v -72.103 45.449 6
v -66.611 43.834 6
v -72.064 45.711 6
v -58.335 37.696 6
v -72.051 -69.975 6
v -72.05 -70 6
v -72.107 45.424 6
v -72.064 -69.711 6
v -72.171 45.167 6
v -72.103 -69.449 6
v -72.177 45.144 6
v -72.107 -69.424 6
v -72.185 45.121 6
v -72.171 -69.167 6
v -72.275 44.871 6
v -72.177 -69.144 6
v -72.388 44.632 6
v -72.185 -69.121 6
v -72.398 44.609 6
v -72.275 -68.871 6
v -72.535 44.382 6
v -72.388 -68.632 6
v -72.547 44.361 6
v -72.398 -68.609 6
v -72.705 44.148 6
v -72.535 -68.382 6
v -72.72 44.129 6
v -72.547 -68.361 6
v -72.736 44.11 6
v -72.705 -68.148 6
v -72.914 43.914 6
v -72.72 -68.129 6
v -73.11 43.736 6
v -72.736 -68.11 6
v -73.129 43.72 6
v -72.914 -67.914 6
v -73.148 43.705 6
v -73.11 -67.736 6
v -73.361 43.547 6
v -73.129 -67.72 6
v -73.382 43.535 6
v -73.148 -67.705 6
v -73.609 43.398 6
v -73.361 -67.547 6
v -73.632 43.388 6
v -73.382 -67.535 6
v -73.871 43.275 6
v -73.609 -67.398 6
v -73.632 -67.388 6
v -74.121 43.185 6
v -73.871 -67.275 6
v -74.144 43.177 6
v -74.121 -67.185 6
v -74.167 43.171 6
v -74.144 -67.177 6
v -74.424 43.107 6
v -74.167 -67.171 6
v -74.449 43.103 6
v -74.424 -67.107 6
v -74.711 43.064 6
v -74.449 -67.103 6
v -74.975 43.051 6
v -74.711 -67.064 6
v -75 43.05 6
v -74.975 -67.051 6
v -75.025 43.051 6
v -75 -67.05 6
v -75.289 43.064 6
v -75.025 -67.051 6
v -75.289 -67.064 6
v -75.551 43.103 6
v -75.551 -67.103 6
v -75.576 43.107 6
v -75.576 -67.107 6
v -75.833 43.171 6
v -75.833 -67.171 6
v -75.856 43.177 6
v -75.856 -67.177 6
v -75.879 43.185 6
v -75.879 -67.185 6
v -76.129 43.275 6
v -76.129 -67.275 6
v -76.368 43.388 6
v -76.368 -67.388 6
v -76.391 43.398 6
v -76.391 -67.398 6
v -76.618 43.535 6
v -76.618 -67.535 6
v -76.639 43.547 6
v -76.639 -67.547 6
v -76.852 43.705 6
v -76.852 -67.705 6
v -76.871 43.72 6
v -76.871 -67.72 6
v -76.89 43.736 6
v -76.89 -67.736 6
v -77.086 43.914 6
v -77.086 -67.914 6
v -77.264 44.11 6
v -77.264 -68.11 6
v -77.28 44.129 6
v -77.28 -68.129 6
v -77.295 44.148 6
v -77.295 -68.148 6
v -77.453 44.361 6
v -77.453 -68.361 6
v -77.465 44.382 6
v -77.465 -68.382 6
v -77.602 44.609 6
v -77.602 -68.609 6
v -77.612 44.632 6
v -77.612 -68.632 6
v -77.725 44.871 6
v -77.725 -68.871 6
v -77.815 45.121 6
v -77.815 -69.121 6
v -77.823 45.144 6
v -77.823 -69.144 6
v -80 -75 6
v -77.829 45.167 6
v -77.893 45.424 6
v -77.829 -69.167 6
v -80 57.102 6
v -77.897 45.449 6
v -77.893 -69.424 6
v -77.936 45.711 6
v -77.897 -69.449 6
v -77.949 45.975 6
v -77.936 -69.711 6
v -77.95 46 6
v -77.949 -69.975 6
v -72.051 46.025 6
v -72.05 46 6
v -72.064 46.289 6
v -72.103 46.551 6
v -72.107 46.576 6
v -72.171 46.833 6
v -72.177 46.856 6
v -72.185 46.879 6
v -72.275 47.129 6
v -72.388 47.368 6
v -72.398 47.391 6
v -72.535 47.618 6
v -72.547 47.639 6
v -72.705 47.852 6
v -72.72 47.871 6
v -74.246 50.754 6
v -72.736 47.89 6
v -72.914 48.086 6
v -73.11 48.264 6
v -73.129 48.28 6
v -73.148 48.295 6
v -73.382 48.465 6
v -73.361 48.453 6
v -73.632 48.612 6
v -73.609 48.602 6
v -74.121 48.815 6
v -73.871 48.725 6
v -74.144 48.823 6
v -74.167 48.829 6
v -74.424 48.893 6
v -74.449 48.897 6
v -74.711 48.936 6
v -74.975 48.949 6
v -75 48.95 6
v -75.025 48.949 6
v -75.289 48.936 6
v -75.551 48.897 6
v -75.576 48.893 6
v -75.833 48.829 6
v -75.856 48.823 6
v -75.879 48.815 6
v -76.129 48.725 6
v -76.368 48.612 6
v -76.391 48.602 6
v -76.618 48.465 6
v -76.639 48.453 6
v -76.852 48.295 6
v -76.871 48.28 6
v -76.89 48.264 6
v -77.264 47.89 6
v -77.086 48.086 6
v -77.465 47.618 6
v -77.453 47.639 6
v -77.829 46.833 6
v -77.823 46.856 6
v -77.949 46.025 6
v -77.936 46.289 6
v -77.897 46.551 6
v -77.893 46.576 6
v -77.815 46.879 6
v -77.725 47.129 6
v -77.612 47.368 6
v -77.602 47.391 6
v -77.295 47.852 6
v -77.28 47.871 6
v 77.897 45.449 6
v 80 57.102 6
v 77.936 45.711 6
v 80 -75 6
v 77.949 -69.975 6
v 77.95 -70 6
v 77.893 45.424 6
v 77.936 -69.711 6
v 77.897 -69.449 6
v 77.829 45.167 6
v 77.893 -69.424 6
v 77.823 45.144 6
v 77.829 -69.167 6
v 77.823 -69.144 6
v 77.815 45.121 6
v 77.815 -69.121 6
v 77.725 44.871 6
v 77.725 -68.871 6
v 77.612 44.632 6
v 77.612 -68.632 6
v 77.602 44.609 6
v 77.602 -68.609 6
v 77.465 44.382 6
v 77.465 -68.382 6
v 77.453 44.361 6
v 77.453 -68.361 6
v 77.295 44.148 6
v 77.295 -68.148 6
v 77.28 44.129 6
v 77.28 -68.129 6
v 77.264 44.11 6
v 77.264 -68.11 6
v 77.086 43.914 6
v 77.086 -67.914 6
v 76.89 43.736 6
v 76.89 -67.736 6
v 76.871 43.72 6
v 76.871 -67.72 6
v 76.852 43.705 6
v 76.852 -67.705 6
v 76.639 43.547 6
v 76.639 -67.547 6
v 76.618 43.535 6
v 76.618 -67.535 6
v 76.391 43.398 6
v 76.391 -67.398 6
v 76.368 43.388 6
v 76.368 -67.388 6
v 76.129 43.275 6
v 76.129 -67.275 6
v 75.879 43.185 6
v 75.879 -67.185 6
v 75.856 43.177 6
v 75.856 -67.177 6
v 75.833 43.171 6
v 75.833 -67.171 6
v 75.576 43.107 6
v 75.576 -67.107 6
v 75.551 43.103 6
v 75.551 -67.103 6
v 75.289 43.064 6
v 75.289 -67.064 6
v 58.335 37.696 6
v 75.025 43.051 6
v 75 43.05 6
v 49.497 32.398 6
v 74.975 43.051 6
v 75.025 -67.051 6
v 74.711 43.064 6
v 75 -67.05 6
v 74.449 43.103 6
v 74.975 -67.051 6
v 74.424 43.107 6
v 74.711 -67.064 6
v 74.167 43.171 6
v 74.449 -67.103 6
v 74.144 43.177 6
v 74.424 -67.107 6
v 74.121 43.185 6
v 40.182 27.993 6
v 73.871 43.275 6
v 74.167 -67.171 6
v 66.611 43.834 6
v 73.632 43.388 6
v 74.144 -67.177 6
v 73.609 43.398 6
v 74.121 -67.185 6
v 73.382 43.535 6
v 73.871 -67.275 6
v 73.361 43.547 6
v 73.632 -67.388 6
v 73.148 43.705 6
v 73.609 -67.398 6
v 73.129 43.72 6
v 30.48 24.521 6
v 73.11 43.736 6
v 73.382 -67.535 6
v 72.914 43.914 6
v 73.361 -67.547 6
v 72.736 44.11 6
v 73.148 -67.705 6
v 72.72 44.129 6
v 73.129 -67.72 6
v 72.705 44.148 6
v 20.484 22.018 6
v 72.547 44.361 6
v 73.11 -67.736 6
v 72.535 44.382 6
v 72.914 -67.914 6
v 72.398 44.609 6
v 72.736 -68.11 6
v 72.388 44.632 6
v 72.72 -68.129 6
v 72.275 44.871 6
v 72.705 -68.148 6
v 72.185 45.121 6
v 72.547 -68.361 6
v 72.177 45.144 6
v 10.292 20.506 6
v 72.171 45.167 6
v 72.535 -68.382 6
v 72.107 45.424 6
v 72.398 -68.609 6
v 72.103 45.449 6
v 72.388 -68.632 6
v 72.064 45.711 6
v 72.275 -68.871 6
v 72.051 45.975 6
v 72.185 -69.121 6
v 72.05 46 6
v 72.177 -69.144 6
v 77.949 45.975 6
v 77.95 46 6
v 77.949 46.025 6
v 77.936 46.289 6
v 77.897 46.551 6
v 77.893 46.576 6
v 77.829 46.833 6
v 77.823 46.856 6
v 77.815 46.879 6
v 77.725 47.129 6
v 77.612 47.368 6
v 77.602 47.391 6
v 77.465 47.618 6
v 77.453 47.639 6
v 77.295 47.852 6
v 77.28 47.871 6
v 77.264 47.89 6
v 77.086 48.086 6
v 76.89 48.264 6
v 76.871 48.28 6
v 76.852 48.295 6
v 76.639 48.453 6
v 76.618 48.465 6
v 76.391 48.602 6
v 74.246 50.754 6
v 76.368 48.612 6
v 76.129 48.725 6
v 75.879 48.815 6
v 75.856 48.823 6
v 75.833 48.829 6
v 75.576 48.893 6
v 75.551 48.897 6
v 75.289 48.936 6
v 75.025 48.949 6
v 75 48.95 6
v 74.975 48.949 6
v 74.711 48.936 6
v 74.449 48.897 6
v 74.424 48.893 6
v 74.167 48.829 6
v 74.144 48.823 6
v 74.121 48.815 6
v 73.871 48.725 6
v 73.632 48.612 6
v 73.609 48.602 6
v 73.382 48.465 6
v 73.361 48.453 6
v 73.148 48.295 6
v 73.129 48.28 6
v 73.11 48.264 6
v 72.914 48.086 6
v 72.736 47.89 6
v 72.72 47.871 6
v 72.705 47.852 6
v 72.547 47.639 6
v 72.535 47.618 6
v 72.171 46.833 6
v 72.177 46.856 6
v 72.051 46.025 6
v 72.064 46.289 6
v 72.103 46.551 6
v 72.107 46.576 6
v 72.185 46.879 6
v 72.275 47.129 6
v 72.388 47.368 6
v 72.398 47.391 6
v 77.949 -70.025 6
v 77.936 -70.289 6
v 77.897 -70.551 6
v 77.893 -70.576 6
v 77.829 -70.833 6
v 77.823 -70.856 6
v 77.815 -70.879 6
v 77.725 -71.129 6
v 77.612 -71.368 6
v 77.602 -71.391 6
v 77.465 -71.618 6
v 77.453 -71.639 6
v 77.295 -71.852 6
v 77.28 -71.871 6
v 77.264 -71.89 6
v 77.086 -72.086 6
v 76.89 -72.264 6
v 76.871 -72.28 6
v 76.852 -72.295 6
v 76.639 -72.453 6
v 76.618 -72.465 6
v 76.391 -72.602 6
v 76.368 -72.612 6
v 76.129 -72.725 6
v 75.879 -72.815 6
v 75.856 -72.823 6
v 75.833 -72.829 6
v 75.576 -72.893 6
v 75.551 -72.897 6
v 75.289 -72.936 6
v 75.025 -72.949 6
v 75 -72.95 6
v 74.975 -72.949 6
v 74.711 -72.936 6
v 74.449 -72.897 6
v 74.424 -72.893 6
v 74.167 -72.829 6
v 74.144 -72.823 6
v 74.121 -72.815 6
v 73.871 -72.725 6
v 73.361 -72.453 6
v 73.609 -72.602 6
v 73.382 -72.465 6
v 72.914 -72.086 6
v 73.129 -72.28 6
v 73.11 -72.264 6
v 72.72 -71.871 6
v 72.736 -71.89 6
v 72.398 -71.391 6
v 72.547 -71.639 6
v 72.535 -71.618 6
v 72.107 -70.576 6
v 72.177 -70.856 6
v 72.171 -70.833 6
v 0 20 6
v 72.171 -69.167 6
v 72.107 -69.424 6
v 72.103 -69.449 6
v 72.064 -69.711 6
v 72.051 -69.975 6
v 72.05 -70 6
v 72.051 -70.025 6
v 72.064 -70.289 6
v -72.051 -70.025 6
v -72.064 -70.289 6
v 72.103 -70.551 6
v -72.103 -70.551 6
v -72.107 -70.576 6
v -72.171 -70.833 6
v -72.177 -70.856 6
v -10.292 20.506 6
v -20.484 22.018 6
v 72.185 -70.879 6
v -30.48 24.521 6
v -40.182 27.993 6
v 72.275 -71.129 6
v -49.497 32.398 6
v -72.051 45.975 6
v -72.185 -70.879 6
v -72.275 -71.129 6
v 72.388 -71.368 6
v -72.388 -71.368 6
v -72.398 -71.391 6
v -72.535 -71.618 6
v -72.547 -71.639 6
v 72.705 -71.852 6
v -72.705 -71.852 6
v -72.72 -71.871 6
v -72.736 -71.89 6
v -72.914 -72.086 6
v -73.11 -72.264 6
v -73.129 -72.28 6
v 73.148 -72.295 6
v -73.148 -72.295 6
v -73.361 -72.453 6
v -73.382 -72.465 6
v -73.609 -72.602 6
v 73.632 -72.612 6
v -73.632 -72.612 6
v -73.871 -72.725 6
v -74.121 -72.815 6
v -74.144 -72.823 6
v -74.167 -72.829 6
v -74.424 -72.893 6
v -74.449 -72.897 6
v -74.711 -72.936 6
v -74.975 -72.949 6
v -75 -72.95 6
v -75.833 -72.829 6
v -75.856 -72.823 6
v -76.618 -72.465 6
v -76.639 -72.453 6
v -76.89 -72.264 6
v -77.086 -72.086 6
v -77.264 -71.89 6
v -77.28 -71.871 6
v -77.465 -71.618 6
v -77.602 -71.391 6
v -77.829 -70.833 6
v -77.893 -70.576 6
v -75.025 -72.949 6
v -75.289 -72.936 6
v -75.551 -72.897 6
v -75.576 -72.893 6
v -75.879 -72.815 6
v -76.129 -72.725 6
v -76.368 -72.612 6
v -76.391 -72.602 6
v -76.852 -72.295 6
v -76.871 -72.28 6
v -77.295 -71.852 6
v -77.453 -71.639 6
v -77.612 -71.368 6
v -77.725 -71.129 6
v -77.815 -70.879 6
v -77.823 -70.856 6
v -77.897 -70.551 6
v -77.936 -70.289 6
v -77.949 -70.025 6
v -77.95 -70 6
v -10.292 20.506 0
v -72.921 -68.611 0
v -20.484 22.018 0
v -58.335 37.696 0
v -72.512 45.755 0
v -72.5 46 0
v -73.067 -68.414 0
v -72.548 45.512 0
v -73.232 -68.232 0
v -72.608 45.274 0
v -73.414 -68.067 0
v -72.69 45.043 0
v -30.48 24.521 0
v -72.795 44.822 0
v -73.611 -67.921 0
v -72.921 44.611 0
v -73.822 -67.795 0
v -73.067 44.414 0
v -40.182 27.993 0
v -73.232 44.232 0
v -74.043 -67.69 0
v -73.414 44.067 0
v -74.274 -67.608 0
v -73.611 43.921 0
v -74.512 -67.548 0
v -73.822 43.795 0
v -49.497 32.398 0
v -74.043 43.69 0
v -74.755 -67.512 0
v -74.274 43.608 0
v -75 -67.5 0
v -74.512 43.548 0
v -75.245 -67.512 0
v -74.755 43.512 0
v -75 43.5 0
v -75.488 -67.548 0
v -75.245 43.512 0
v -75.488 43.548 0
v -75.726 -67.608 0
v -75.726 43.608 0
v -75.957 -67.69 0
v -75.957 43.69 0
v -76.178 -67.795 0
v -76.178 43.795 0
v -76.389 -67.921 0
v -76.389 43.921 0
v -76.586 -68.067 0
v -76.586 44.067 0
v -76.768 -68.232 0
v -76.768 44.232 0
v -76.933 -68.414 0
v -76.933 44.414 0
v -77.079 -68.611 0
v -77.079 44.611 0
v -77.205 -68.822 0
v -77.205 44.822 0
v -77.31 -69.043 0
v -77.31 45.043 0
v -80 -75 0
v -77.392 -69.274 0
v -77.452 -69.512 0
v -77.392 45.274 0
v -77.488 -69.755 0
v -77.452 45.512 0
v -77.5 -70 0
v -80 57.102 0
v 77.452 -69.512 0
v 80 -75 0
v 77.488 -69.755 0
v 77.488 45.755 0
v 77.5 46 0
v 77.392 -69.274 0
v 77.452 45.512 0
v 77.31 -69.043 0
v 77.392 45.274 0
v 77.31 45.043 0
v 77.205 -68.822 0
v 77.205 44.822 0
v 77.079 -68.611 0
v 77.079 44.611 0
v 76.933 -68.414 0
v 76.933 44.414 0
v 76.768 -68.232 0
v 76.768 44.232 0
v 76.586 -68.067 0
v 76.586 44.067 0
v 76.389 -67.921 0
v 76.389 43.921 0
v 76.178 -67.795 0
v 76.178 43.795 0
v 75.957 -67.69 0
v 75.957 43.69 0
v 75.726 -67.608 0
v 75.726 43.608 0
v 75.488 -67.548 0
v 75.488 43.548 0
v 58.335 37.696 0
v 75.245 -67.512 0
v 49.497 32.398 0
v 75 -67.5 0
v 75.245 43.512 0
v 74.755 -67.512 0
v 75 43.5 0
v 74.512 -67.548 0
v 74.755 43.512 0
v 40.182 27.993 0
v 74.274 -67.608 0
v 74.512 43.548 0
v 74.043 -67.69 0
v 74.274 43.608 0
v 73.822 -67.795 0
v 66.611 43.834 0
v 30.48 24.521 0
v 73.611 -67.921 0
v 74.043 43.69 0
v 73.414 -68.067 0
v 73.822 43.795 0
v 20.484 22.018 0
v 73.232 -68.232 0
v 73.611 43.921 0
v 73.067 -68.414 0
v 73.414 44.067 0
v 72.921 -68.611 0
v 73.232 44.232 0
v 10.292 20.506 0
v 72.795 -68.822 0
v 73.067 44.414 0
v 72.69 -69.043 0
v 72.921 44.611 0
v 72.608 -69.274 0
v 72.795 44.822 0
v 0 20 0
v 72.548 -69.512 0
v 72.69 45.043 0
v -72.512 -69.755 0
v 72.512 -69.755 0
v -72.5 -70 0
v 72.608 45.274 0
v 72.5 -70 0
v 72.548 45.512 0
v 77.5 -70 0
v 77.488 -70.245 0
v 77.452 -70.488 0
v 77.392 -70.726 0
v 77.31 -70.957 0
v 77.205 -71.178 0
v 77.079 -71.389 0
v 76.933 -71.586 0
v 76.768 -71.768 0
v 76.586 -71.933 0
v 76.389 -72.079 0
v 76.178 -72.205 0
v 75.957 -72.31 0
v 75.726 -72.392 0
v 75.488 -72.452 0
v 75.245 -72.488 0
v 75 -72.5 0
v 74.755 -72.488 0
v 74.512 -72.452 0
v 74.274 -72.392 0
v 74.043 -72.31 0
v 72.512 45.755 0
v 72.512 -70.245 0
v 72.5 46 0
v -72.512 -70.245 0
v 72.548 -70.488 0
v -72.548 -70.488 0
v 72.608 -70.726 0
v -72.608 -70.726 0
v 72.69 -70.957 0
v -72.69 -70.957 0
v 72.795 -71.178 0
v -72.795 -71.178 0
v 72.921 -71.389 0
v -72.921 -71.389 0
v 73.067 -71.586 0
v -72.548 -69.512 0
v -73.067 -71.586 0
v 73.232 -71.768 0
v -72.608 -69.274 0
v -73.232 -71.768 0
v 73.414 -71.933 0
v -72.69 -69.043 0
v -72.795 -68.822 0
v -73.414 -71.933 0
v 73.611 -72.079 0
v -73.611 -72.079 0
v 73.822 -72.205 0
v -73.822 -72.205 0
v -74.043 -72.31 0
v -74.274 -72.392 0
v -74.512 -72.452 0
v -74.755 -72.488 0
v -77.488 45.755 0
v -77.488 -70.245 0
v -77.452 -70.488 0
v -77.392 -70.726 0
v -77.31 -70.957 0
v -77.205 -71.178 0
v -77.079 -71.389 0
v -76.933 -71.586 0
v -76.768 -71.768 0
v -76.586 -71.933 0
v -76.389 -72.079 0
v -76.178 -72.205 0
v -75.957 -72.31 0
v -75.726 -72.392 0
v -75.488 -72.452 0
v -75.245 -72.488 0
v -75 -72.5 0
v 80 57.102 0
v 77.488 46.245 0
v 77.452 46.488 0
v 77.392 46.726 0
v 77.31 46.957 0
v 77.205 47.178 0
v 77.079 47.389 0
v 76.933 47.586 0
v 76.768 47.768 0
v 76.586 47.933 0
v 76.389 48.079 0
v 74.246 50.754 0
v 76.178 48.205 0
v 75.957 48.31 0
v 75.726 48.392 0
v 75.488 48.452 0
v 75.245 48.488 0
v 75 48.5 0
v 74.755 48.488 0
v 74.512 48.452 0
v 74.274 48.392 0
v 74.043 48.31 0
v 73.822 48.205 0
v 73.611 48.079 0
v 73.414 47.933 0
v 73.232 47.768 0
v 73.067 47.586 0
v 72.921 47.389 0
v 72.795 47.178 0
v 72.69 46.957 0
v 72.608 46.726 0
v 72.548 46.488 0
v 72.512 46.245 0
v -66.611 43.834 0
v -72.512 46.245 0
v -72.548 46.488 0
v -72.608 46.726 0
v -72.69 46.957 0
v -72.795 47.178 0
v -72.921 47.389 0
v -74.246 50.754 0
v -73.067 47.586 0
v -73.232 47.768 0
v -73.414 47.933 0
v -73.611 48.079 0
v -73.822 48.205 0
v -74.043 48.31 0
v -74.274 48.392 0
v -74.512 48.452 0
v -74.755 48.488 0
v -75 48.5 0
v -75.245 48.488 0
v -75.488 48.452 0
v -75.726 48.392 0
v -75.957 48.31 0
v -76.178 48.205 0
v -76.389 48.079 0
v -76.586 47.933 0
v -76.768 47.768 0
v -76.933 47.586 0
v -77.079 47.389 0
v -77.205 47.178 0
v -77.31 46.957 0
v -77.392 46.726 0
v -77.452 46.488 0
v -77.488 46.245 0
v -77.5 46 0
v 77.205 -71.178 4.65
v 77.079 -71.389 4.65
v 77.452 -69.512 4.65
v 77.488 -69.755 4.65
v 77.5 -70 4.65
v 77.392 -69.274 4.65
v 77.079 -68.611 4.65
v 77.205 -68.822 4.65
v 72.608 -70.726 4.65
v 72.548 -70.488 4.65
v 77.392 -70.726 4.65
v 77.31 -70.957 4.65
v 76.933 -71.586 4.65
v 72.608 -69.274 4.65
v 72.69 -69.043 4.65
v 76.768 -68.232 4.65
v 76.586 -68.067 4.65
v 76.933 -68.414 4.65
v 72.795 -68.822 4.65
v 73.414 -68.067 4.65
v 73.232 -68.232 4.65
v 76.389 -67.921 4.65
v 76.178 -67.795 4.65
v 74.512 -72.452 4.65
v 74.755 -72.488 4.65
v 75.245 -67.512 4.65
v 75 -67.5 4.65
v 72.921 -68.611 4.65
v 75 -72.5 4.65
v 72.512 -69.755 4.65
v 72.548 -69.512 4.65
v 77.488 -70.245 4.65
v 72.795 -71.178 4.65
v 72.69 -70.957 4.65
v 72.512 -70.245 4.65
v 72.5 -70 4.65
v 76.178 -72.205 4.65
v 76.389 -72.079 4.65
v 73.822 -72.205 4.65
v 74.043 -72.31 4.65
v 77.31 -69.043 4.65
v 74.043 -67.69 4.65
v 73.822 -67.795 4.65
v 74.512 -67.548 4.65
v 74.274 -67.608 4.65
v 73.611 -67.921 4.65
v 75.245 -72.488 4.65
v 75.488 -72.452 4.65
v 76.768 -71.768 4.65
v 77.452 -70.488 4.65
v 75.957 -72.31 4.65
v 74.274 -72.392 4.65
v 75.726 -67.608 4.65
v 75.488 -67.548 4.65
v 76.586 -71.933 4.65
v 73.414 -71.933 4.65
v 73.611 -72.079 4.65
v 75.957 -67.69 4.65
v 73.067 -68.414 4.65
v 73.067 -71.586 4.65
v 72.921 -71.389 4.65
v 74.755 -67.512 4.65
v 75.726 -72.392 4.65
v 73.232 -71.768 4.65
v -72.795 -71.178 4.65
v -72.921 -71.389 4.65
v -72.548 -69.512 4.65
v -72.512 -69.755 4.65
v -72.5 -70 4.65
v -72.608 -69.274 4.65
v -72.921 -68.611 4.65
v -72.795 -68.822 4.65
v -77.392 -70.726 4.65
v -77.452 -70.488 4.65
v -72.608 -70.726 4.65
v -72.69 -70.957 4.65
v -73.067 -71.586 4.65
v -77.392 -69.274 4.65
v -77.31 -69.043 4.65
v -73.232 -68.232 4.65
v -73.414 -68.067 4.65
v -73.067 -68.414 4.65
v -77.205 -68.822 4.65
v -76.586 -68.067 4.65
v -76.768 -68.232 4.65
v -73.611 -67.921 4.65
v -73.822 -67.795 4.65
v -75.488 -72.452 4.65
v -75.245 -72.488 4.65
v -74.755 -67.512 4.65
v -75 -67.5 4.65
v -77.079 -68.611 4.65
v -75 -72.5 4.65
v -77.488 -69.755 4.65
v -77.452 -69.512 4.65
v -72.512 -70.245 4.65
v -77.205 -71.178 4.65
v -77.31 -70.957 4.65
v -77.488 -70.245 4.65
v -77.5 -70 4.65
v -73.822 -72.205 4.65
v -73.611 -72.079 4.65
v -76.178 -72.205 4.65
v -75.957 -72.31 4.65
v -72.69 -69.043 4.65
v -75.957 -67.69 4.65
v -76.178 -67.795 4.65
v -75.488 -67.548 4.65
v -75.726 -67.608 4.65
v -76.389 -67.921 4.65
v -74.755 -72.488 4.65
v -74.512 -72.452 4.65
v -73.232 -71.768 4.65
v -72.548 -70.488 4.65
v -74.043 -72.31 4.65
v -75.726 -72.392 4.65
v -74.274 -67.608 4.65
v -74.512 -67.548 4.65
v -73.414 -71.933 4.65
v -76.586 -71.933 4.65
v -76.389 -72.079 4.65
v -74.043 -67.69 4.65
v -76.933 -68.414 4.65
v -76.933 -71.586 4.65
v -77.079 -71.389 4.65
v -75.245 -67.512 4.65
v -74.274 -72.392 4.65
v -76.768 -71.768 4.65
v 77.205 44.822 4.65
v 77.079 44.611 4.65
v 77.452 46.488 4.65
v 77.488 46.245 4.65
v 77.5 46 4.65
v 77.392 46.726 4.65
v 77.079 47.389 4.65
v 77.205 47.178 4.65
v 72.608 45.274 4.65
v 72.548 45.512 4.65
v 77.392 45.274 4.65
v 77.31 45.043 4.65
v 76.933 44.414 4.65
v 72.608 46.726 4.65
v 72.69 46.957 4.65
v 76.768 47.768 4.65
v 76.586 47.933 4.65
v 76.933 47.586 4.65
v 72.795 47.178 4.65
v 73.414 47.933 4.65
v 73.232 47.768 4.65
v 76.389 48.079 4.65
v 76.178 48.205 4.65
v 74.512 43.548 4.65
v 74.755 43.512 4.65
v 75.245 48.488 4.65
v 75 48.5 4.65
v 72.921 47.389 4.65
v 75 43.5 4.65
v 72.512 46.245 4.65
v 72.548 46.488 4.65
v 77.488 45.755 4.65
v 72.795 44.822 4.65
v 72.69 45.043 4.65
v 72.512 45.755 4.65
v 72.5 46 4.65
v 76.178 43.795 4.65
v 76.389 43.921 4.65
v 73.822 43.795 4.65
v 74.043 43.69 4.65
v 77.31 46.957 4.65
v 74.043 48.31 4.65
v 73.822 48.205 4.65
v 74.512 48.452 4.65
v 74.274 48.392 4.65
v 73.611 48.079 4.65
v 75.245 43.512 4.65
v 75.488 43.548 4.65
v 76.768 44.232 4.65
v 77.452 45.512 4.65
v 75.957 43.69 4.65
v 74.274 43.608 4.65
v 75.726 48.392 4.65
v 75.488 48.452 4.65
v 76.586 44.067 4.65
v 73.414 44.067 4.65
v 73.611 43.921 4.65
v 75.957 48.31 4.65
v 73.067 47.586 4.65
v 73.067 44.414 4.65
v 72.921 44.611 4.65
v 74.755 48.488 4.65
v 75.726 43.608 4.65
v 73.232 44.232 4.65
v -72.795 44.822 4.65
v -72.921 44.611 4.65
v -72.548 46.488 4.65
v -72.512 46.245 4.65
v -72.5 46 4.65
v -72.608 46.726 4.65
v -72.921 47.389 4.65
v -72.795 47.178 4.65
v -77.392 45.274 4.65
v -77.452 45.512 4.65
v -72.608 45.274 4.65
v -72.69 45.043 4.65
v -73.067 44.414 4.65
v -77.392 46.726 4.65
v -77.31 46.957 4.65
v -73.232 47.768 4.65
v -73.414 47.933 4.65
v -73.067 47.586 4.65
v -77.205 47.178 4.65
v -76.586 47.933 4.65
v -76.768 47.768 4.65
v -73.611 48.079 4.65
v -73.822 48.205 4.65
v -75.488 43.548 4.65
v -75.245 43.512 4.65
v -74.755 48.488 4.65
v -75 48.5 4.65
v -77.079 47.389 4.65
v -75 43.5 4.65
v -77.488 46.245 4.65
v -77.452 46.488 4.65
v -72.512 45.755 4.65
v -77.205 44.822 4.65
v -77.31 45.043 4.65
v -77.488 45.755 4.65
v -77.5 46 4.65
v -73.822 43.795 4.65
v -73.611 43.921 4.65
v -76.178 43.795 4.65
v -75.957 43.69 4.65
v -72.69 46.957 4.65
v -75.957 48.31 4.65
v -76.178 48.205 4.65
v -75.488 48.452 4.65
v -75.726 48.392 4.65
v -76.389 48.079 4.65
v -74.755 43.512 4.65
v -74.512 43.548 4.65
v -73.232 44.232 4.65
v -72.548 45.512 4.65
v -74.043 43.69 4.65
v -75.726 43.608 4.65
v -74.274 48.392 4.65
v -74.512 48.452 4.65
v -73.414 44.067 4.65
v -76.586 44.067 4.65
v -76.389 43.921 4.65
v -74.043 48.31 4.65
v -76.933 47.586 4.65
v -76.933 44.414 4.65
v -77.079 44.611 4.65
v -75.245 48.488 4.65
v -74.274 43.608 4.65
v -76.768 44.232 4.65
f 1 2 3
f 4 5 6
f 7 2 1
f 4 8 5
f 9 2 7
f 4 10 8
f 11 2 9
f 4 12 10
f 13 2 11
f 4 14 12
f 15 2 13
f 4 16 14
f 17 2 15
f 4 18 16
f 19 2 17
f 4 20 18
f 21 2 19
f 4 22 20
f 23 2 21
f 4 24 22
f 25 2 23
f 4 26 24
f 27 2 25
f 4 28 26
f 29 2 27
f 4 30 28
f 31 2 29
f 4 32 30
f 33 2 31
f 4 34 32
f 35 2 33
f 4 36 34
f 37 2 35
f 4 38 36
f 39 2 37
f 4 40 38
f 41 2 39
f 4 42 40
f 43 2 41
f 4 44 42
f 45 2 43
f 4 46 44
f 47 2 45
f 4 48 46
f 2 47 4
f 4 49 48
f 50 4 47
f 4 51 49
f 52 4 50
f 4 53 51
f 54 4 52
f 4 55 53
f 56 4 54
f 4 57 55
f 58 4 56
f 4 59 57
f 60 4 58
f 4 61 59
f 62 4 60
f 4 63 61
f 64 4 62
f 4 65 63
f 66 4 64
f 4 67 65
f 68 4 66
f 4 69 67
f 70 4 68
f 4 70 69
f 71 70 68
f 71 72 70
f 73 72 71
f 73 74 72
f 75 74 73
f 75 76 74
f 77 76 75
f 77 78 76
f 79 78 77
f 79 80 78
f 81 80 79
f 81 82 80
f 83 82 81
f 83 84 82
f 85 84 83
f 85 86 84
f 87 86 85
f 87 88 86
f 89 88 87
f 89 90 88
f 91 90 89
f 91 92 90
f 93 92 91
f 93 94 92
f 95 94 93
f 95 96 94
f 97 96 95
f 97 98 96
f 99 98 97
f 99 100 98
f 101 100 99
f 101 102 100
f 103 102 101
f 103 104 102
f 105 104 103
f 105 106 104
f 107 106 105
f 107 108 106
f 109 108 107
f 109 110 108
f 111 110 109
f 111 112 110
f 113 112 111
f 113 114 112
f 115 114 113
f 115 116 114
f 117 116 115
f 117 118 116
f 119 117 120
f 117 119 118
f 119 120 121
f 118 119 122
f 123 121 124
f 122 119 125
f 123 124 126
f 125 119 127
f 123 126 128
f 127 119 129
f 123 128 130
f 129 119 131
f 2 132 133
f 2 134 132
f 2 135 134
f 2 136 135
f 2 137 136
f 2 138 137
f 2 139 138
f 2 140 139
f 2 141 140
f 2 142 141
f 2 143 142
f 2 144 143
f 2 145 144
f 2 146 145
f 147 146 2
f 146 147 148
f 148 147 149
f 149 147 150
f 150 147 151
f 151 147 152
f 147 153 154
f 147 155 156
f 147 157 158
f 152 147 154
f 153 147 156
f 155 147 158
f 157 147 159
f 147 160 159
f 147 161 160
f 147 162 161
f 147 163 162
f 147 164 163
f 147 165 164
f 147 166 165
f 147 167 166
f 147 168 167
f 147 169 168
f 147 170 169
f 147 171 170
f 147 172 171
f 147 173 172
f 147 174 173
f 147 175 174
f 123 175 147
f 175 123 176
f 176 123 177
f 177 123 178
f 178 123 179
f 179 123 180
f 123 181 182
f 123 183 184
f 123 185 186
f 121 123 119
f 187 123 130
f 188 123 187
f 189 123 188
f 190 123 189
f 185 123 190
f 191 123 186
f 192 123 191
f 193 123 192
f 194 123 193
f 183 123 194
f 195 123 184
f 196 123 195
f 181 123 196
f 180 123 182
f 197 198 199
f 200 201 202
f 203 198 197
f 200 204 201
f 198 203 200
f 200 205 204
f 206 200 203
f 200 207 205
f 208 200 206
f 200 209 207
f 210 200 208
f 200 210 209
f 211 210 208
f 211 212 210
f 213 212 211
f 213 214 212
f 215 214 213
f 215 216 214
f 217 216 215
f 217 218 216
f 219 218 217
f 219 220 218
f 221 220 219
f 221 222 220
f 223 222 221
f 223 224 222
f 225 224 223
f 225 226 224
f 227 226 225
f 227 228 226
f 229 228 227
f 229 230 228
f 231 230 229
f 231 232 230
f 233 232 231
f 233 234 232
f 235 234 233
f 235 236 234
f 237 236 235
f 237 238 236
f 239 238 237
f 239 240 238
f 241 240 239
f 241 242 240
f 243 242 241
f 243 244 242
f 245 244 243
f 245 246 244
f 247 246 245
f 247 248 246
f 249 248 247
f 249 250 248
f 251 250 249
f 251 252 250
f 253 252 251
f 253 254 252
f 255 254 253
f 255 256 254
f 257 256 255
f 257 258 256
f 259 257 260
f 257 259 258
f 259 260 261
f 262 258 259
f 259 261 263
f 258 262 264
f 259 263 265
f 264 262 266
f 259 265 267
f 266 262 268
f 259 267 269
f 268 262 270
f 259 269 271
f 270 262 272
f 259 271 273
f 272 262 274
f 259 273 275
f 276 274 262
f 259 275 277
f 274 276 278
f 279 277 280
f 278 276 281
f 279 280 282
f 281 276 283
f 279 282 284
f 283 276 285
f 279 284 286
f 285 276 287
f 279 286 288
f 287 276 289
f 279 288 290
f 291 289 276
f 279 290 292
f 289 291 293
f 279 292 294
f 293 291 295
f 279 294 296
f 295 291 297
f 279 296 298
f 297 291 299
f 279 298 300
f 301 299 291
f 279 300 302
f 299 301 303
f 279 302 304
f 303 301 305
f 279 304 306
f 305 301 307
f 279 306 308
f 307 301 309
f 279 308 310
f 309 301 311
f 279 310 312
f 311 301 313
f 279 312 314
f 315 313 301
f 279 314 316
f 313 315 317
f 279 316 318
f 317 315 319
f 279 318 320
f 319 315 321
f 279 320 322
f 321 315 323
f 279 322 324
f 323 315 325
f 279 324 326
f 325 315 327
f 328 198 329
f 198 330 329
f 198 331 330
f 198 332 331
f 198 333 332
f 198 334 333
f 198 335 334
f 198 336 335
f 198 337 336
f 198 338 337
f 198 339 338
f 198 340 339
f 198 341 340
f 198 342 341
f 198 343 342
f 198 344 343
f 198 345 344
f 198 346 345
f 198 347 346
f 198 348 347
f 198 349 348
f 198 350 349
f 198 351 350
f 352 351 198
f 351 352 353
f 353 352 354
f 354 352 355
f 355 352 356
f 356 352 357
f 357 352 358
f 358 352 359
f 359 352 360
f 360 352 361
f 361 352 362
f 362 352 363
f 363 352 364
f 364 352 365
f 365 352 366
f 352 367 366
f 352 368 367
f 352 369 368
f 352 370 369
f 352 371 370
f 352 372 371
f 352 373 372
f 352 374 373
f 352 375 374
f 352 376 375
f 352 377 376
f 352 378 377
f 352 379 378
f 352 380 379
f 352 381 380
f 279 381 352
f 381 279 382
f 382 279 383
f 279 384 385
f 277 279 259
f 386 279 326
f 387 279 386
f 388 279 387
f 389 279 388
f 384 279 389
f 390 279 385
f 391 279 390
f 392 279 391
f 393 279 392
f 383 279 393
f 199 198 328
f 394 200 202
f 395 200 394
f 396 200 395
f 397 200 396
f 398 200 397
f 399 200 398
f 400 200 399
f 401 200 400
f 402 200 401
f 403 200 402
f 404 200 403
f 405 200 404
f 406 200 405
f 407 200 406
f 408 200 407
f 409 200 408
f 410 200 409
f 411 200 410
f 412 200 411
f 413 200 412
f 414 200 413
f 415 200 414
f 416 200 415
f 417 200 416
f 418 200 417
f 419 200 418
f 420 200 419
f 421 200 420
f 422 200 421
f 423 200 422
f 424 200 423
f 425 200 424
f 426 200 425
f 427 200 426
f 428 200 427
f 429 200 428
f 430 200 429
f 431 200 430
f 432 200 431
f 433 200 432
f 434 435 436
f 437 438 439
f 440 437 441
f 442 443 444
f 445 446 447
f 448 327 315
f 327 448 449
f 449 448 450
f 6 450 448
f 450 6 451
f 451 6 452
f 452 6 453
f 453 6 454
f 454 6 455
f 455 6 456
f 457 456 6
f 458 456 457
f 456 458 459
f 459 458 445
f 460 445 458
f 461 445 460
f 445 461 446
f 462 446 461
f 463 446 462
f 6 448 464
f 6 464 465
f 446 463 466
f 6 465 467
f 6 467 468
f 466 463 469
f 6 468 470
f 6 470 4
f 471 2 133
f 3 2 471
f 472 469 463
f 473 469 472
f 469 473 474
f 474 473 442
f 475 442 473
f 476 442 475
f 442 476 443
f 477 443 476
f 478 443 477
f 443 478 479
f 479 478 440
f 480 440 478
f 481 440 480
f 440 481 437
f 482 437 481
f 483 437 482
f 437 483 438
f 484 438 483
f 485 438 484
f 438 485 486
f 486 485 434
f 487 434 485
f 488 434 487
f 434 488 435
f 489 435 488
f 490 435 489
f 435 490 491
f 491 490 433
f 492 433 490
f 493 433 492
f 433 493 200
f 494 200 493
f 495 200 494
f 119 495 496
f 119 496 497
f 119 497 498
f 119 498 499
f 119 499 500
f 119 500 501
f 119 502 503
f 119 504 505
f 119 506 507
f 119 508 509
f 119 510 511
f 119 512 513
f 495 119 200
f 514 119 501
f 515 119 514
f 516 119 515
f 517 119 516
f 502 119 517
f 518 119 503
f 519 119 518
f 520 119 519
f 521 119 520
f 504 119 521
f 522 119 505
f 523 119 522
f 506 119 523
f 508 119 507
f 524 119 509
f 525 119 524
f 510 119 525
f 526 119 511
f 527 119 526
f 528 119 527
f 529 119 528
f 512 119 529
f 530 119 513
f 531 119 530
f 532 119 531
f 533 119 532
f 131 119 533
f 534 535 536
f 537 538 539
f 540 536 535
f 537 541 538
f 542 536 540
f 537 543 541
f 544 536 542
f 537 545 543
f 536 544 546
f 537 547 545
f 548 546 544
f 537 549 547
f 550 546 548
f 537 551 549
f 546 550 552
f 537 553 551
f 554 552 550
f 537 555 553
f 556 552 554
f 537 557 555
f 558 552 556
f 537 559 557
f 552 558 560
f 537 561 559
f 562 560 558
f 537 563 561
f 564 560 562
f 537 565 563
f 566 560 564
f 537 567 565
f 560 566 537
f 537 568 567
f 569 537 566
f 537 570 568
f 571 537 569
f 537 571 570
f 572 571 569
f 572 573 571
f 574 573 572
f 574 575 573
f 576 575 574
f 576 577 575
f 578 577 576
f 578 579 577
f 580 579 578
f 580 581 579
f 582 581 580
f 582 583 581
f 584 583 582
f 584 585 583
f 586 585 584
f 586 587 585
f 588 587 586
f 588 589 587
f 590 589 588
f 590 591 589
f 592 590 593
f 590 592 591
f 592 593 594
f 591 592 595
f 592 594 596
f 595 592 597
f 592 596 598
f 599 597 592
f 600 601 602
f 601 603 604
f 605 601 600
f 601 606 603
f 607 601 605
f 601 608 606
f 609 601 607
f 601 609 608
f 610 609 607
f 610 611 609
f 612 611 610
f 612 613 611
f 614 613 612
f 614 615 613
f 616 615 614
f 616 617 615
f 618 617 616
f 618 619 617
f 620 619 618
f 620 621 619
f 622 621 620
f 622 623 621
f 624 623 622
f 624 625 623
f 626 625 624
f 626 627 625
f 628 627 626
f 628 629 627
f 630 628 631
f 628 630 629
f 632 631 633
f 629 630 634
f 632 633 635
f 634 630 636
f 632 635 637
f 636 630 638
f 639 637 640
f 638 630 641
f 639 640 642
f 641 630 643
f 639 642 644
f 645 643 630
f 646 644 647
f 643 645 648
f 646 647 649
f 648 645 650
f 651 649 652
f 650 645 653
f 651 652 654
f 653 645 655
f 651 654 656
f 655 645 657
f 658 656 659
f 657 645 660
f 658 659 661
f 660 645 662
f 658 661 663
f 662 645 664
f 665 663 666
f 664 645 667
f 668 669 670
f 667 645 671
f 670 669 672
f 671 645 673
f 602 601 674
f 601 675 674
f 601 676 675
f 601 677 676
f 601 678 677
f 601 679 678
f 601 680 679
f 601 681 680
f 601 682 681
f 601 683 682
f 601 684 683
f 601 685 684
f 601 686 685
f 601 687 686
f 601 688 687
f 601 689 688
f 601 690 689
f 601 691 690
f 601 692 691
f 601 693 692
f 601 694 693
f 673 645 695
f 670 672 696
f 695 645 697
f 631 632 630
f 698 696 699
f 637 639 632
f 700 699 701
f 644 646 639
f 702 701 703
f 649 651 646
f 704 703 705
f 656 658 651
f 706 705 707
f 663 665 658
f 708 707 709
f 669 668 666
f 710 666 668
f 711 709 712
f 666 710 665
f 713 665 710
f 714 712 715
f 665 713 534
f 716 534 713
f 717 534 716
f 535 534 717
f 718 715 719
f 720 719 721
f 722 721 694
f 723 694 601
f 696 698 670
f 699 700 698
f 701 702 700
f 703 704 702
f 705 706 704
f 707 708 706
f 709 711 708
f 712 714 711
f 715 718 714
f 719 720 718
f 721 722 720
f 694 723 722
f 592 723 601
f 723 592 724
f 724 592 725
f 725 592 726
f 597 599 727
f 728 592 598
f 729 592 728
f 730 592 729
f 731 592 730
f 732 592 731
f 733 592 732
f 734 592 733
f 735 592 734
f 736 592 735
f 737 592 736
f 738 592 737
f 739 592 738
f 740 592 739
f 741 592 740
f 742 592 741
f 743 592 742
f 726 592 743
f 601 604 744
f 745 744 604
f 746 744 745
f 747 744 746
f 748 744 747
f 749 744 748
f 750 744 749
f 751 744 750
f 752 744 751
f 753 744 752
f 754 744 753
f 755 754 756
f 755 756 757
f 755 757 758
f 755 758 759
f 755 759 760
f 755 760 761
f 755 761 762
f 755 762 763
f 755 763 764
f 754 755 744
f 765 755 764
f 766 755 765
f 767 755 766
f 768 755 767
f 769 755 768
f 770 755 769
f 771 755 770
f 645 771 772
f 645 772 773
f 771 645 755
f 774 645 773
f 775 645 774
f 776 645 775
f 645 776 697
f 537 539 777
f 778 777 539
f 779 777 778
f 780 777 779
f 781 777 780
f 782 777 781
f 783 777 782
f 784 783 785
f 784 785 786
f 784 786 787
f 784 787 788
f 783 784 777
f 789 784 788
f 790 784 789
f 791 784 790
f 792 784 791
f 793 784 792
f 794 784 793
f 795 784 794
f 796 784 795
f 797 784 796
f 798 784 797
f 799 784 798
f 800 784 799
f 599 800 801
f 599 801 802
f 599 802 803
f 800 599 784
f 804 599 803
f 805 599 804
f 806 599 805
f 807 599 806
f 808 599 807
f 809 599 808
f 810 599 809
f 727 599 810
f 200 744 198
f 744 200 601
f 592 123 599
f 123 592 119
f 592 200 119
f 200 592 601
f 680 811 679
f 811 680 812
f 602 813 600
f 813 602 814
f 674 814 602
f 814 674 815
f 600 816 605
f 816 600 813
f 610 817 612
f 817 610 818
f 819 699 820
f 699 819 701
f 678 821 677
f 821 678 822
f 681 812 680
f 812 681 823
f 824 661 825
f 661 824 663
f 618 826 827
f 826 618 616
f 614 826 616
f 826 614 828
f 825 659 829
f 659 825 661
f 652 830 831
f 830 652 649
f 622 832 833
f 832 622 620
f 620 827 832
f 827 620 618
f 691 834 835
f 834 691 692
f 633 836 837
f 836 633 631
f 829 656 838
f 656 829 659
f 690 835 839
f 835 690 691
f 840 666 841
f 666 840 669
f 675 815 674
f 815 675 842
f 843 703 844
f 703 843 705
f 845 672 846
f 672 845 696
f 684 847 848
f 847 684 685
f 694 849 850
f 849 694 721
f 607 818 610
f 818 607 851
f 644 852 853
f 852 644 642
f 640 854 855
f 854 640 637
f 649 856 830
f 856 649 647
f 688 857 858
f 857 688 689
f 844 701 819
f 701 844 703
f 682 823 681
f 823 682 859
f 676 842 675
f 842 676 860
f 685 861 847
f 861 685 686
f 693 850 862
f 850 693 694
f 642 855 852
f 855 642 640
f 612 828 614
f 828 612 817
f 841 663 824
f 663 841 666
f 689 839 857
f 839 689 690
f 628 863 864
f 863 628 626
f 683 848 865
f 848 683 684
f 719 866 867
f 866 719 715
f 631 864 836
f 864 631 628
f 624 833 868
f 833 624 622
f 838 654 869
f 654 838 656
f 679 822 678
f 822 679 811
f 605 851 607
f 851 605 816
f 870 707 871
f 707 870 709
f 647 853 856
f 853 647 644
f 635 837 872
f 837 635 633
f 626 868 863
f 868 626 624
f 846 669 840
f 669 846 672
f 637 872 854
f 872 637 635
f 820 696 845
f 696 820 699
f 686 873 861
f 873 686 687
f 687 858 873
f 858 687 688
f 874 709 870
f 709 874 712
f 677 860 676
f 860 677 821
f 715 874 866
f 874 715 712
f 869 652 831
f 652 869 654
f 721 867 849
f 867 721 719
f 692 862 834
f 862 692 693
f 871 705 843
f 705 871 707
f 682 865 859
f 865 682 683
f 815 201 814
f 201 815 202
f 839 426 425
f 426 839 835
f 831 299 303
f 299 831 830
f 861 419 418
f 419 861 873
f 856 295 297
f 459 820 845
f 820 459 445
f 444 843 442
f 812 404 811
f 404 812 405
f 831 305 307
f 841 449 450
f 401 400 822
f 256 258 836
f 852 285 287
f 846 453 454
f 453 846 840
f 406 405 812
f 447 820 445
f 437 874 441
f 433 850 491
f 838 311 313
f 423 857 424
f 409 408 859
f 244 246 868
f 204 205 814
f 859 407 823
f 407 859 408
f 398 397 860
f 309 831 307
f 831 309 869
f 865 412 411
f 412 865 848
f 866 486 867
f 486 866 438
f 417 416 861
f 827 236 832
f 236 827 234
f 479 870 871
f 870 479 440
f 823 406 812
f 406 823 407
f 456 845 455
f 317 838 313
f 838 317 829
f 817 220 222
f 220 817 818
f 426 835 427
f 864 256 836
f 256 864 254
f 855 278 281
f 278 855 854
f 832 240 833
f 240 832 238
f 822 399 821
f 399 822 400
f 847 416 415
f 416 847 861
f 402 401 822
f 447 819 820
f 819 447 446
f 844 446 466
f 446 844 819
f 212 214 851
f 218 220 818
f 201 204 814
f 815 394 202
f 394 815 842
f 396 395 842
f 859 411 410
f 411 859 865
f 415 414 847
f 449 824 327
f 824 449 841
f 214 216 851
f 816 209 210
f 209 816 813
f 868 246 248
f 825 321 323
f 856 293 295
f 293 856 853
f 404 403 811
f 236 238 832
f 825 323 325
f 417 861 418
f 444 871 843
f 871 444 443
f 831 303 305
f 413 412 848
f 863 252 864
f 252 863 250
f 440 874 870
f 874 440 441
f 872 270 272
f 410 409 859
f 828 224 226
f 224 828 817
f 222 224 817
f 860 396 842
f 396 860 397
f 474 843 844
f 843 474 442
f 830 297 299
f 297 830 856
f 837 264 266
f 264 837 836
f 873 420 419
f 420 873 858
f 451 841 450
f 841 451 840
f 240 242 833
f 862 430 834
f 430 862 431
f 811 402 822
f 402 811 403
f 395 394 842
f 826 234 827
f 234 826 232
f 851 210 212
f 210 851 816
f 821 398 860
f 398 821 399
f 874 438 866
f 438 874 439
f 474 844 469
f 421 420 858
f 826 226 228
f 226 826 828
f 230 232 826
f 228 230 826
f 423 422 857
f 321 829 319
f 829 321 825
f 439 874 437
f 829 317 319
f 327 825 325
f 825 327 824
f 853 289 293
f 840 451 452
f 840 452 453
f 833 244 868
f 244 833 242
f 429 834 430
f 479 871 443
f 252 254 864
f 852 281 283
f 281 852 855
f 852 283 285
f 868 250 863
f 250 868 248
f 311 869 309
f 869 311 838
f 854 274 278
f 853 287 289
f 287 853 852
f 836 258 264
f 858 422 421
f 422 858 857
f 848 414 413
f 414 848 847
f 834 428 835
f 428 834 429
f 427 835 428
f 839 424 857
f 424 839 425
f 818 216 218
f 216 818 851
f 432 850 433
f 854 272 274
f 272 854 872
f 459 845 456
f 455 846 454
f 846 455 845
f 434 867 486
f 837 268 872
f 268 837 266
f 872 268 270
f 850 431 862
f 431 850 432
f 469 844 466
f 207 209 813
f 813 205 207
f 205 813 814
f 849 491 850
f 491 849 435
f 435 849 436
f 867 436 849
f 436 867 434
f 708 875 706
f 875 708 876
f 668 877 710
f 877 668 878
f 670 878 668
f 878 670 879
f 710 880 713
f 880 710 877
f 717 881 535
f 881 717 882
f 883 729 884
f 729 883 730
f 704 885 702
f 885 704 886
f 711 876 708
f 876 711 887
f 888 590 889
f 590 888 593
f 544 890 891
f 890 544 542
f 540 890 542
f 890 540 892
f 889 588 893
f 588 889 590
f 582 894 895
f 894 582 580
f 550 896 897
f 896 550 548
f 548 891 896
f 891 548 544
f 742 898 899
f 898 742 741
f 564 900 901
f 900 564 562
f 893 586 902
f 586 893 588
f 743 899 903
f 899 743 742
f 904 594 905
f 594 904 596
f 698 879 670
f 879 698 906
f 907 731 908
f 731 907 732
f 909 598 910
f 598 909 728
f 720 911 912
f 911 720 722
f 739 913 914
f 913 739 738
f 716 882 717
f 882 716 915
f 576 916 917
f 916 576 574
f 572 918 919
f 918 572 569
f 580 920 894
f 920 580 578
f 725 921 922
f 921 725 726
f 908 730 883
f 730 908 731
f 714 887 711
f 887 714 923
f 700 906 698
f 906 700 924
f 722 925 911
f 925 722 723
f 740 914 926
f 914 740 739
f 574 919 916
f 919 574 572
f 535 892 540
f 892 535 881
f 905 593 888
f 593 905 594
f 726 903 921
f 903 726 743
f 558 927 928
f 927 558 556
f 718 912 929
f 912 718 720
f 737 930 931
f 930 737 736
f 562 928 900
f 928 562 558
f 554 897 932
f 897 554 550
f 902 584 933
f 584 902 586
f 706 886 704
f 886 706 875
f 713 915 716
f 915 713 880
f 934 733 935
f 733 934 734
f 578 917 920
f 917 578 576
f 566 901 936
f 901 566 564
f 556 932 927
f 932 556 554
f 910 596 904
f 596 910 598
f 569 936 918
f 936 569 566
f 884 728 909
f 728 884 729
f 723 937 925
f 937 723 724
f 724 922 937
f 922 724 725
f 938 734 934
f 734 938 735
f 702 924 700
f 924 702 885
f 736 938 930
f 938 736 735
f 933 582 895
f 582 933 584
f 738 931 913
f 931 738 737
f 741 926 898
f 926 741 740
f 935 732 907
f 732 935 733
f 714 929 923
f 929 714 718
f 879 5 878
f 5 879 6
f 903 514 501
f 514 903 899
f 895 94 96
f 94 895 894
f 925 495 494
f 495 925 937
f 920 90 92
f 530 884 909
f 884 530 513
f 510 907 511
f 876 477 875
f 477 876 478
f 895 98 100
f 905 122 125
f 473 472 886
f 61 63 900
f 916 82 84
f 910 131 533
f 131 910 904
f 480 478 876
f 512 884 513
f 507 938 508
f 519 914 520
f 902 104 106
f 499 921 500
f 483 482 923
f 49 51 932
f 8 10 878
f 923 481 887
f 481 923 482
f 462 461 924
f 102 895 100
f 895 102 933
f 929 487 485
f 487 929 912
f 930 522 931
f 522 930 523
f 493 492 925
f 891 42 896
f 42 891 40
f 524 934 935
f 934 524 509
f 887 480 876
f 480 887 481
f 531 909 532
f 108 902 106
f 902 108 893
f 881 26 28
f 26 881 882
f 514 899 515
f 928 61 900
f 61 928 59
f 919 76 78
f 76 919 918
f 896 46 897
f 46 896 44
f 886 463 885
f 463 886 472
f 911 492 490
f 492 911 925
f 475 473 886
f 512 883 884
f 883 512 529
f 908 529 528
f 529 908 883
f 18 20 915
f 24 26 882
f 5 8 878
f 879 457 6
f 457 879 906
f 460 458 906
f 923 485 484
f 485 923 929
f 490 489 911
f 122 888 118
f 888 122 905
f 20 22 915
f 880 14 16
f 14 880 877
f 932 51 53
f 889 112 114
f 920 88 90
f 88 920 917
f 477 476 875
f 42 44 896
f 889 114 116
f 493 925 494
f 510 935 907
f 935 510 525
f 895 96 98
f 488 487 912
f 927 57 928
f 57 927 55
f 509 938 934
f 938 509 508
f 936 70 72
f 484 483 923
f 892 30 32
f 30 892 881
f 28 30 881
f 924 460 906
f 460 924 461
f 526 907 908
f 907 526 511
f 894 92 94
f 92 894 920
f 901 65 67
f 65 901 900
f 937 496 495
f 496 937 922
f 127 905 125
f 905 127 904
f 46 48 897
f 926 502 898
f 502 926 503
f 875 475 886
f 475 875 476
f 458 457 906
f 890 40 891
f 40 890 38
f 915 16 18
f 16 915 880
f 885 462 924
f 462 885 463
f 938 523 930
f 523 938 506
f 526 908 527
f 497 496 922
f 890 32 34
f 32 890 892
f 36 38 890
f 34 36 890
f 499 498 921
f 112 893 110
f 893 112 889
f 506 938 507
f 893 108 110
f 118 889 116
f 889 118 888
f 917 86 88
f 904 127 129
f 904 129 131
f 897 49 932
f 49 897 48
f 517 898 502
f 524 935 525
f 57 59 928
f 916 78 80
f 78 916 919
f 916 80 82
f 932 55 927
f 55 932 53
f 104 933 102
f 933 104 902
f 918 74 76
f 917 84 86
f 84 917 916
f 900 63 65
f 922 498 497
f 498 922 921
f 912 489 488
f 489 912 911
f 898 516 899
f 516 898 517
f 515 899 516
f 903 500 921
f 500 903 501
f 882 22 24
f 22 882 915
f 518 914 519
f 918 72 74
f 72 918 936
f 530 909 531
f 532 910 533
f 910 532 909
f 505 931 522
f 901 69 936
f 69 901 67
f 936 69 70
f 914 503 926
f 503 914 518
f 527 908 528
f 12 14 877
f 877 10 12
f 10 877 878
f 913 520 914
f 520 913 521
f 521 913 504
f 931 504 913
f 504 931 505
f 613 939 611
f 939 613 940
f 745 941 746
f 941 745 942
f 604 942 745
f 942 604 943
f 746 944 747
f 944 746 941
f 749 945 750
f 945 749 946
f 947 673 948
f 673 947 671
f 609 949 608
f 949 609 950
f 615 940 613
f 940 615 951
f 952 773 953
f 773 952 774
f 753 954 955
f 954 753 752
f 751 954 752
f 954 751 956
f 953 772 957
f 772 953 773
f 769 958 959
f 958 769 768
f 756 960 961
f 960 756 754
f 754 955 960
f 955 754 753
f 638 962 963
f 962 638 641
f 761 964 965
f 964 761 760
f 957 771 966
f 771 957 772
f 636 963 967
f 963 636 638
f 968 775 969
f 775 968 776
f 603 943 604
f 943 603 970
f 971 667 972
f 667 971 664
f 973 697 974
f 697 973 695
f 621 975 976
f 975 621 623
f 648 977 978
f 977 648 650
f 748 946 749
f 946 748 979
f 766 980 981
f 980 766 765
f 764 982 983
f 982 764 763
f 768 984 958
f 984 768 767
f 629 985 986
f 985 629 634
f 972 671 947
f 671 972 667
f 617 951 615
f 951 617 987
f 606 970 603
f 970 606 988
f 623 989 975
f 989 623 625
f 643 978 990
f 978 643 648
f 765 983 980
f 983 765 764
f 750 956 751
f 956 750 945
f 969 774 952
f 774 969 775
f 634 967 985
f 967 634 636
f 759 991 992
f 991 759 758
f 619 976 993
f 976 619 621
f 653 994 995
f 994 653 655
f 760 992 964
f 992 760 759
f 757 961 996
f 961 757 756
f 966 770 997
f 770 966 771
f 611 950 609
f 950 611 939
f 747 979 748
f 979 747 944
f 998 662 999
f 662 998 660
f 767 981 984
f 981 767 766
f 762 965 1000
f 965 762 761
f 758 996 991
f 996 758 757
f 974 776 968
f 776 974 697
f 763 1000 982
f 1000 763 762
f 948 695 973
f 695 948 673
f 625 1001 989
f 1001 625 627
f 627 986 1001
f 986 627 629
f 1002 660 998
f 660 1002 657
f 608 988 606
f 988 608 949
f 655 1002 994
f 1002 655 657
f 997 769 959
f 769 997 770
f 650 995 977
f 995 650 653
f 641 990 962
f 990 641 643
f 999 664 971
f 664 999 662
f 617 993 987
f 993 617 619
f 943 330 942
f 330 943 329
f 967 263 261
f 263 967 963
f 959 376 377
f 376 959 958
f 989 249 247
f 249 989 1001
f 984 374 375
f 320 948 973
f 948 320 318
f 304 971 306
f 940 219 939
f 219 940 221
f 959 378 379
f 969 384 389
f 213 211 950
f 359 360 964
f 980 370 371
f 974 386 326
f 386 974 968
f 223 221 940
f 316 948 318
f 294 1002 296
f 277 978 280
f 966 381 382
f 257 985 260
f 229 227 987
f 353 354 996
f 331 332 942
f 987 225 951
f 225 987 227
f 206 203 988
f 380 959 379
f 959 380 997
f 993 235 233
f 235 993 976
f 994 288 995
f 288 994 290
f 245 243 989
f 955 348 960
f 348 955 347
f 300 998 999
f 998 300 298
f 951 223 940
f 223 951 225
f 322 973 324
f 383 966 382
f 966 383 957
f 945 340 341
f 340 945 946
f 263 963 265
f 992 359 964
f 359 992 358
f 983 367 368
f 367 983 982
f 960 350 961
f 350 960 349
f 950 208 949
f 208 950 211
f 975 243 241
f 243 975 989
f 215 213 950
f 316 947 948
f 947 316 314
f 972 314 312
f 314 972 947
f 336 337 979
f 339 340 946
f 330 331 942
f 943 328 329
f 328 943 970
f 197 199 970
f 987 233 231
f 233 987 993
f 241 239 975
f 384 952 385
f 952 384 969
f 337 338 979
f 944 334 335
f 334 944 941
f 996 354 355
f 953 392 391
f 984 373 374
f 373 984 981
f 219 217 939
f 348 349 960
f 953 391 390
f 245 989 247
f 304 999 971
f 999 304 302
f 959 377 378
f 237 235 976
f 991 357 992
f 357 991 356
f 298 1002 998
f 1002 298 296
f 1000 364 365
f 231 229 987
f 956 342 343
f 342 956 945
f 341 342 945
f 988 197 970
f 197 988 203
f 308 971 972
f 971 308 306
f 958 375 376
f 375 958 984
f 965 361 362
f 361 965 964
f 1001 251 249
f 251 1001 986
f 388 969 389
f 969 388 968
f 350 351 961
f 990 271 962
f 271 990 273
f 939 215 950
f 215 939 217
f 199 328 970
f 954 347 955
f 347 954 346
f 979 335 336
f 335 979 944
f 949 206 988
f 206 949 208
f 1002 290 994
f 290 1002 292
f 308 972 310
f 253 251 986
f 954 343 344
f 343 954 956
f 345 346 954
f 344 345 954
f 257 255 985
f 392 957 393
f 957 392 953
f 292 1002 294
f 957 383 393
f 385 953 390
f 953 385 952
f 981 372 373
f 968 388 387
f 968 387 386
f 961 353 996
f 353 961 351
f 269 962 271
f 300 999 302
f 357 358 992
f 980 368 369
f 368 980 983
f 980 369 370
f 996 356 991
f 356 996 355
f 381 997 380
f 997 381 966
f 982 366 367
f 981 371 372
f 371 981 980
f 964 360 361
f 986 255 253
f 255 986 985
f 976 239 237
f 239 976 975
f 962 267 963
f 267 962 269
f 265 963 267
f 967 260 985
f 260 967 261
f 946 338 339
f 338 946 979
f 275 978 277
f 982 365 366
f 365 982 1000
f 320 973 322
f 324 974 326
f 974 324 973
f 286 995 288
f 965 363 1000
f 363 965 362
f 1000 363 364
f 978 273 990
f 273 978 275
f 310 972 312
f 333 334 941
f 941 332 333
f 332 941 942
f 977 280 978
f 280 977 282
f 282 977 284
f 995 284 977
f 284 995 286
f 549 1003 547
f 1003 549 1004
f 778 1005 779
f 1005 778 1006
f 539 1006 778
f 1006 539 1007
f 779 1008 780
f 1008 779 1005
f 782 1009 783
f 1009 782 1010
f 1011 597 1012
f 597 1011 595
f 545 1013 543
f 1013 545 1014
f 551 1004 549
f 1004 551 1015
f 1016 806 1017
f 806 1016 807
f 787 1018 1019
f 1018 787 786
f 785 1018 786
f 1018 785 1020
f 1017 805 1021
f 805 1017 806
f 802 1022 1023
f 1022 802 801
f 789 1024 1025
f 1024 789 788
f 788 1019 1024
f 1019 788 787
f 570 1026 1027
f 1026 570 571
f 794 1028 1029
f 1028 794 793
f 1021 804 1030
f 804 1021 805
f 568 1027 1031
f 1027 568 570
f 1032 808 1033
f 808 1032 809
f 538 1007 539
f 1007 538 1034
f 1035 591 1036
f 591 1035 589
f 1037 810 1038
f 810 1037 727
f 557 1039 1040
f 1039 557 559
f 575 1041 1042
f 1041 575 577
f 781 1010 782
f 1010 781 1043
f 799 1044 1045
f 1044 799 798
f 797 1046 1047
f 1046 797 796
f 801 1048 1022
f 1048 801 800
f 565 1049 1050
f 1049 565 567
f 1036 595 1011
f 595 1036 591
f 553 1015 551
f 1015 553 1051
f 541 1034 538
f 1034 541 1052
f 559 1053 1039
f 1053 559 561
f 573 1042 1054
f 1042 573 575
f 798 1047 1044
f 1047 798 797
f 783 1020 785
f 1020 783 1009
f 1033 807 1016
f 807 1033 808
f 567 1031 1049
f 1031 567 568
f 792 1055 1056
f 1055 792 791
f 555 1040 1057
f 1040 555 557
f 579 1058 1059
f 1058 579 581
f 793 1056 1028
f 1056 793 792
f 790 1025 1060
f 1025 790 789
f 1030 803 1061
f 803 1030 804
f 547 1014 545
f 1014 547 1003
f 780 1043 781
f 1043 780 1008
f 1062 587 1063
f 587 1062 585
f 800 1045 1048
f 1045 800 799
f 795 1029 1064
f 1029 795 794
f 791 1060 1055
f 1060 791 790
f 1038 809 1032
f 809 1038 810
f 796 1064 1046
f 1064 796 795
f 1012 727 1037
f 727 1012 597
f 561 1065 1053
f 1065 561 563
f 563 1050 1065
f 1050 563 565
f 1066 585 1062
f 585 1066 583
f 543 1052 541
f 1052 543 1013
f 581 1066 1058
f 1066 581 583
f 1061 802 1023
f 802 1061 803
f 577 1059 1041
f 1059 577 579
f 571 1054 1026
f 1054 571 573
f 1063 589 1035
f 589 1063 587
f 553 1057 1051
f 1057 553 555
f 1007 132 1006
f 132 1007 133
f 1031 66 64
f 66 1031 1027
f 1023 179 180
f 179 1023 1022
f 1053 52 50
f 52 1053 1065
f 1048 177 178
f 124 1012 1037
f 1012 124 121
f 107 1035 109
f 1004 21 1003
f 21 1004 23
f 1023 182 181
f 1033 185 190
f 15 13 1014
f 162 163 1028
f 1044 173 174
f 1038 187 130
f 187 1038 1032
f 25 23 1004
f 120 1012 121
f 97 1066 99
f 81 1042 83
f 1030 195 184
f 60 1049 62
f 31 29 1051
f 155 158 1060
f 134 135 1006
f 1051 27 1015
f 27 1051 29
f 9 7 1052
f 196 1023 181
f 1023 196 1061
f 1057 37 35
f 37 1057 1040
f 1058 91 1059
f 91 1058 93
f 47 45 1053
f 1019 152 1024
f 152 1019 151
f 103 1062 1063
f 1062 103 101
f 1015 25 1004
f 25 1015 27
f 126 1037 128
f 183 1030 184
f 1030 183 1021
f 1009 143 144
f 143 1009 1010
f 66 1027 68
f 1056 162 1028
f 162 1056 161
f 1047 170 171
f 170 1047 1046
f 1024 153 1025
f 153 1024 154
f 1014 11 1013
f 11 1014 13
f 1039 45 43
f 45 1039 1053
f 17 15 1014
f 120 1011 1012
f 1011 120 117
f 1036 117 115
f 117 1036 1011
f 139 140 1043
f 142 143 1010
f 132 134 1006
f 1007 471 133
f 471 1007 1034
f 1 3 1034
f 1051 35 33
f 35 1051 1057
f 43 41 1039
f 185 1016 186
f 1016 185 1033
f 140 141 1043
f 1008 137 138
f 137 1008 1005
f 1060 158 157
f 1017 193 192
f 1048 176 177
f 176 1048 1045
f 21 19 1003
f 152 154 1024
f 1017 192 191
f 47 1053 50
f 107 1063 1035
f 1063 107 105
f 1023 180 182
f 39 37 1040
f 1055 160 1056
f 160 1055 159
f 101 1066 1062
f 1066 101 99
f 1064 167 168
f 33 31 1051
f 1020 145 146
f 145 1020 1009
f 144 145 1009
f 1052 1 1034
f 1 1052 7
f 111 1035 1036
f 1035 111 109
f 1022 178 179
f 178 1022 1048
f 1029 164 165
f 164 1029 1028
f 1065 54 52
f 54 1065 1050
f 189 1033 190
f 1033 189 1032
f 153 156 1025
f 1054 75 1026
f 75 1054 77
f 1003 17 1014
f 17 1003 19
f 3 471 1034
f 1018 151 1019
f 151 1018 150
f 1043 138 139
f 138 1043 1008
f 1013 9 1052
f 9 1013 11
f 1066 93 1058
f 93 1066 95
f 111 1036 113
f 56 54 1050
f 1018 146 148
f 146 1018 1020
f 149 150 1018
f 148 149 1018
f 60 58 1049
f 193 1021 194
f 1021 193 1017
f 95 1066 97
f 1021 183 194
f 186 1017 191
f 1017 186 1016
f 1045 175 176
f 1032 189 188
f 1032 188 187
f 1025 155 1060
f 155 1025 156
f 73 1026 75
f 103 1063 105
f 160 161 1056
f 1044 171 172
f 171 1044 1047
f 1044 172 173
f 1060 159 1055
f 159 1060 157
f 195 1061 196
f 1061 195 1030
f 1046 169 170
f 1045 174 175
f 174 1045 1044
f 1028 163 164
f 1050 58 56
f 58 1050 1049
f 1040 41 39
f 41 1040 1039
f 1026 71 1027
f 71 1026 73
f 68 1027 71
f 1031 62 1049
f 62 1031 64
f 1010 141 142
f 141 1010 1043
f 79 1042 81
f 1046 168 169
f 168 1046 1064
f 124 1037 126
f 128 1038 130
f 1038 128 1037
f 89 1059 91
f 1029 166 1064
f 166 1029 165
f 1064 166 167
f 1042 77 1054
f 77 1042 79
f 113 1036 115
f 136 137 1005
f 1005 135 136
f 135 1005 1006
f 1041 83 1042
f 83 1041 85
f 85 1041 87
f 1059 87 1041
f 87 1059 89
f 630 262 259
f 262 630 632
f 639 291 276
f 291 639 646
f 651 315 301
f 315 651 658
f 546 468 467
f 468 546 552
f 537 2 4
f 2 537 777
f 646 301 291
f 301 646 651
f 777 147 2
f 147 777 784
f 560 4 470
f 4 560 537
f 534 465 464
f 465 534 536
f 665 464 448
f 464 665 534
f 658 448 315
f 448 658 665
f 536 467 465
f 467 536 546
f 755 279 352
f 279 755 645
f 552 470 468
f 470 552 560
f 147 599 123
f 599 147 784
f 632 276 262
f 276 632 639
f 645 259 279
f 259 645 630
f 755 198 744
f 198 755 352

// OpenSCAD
// file: knurlpocket.scad
//Module to create a knurl pocket suitable for Heat-set inserts
//Global vars
$fa = 1;
$fs = 0.2;
knurl_radius = 1.75;
knurl_wall = 1.6;


module m2knurl_ring(knurl_depth = 5)
{

  ringR=knurl_radius+knurl_wall;
    difference() {   
        cylinder(h=knurl_depth, r1=2*ringR, r2=ringR, center=true);
        m2knurl_pocket(knurl_depth = 5);
    }
    
}

module m2knurl_pocket(knurl_depth = 5)
{
 union() {
    cylinder(h=knurl_depth+0.001, r=knurl_radius,center=true);
    translate([0,0,0.4*knurl_depth])
        cylinder(h=0.25 * knurl_depth, r1=knurl_radius, r2=1.2*knurl_radius, center=true);
 }
}

knurl3_radius = 2.5;
knurl3_wall = 2.5;


module m3knurl_ring(knurl_depth = 5)
{

    difference() {   
        cylinder(h=knurl_depth, r=knurl3_radius+knurl3_wall,center=true);
        m3knurl_pocket(knurl_depth = 5);
    }
    
}

module m3knurl_pocket(knurl_depth = 5)
{
 union() {
    cylinder(h=knurl_depth+0.001, r=knurl3_radius, center=true);
    translate([0,0,0.4*knurl_depth])
        cylinder(h=0.25 * knurl_depth, r1=knurl3_radius, r2=1.2*knurl3_radius, center=true);
 }
}

m2knurl_ring();
translate([10,0,0]) m2knurl_pocket();
translate([-10,0,0]) m3knurl_pocket();
translate([-10,10,0]) m3knurl_ring();
// main file
use <knurlpocket.scad>



$fn=64;

thickness=2;
boxX=160;
boxY=150;
scaleD=210;
boardHeight=20;
frame=8;
boxHeight=6;

displayHeight=32;

displayY=20+displayHeight/2-boxY/2;

boardX=89;

screw_radius = 1.75;
corner_screw_distance = 5;
screwX=boxX/2-corner_screw_distance;
screwYin=46;
screwYout=-boxY/2+corner_screw_distance;


module bottom()
{
    difference()
    {
        union()
        {
          // square box
          translate([0,0,boxHeight/2])cube([boxX,boxY,boxHeight],center=true);
           
            // cylinder wall
            difference(){
             translate([0,scaleD/2+boardHeight,boxHeight/2])
                cylinder(d=scaleD+2*thickness,h=boxHeight,center=true);
             translate([scaleD/2+boxX/2,scaleD/2+boardHeight,boxHeight/2])cube([scaleD,scaleD,boxHeight],center=true);
             translate([-scaleD/2-boxX/2,scaleD/2+boardHeight,boxHeight/2])cube([scaleD,scaleD,boxHeight],center=true);
             translate([0,1.5*boxY,boxHeight/2])cube([boxX,boxY,boxHeight],center=true);

            }
    
        }

        translate([0,scaleD/2+boardHeight,0])cylinder(d=scaleD,h=1000,center=true);
        
        //knurl holes
        translate([screwX,screwYout,boxHeight/2])
            m3knurl_pocket(boxHeight);
        translate([-screwX,screwYout,boxHeight/2])
            m3knurl_pocket(boxHeight);
        translate([screwX,screwYin,boxHeight/2])
            m3knurl_pocket(boxHeight);
        translate([-screwX,screwYin,boxHeight/2])
            m3knurl_pocket(boxHeight);
        
        

    }
    

}


bottom();
